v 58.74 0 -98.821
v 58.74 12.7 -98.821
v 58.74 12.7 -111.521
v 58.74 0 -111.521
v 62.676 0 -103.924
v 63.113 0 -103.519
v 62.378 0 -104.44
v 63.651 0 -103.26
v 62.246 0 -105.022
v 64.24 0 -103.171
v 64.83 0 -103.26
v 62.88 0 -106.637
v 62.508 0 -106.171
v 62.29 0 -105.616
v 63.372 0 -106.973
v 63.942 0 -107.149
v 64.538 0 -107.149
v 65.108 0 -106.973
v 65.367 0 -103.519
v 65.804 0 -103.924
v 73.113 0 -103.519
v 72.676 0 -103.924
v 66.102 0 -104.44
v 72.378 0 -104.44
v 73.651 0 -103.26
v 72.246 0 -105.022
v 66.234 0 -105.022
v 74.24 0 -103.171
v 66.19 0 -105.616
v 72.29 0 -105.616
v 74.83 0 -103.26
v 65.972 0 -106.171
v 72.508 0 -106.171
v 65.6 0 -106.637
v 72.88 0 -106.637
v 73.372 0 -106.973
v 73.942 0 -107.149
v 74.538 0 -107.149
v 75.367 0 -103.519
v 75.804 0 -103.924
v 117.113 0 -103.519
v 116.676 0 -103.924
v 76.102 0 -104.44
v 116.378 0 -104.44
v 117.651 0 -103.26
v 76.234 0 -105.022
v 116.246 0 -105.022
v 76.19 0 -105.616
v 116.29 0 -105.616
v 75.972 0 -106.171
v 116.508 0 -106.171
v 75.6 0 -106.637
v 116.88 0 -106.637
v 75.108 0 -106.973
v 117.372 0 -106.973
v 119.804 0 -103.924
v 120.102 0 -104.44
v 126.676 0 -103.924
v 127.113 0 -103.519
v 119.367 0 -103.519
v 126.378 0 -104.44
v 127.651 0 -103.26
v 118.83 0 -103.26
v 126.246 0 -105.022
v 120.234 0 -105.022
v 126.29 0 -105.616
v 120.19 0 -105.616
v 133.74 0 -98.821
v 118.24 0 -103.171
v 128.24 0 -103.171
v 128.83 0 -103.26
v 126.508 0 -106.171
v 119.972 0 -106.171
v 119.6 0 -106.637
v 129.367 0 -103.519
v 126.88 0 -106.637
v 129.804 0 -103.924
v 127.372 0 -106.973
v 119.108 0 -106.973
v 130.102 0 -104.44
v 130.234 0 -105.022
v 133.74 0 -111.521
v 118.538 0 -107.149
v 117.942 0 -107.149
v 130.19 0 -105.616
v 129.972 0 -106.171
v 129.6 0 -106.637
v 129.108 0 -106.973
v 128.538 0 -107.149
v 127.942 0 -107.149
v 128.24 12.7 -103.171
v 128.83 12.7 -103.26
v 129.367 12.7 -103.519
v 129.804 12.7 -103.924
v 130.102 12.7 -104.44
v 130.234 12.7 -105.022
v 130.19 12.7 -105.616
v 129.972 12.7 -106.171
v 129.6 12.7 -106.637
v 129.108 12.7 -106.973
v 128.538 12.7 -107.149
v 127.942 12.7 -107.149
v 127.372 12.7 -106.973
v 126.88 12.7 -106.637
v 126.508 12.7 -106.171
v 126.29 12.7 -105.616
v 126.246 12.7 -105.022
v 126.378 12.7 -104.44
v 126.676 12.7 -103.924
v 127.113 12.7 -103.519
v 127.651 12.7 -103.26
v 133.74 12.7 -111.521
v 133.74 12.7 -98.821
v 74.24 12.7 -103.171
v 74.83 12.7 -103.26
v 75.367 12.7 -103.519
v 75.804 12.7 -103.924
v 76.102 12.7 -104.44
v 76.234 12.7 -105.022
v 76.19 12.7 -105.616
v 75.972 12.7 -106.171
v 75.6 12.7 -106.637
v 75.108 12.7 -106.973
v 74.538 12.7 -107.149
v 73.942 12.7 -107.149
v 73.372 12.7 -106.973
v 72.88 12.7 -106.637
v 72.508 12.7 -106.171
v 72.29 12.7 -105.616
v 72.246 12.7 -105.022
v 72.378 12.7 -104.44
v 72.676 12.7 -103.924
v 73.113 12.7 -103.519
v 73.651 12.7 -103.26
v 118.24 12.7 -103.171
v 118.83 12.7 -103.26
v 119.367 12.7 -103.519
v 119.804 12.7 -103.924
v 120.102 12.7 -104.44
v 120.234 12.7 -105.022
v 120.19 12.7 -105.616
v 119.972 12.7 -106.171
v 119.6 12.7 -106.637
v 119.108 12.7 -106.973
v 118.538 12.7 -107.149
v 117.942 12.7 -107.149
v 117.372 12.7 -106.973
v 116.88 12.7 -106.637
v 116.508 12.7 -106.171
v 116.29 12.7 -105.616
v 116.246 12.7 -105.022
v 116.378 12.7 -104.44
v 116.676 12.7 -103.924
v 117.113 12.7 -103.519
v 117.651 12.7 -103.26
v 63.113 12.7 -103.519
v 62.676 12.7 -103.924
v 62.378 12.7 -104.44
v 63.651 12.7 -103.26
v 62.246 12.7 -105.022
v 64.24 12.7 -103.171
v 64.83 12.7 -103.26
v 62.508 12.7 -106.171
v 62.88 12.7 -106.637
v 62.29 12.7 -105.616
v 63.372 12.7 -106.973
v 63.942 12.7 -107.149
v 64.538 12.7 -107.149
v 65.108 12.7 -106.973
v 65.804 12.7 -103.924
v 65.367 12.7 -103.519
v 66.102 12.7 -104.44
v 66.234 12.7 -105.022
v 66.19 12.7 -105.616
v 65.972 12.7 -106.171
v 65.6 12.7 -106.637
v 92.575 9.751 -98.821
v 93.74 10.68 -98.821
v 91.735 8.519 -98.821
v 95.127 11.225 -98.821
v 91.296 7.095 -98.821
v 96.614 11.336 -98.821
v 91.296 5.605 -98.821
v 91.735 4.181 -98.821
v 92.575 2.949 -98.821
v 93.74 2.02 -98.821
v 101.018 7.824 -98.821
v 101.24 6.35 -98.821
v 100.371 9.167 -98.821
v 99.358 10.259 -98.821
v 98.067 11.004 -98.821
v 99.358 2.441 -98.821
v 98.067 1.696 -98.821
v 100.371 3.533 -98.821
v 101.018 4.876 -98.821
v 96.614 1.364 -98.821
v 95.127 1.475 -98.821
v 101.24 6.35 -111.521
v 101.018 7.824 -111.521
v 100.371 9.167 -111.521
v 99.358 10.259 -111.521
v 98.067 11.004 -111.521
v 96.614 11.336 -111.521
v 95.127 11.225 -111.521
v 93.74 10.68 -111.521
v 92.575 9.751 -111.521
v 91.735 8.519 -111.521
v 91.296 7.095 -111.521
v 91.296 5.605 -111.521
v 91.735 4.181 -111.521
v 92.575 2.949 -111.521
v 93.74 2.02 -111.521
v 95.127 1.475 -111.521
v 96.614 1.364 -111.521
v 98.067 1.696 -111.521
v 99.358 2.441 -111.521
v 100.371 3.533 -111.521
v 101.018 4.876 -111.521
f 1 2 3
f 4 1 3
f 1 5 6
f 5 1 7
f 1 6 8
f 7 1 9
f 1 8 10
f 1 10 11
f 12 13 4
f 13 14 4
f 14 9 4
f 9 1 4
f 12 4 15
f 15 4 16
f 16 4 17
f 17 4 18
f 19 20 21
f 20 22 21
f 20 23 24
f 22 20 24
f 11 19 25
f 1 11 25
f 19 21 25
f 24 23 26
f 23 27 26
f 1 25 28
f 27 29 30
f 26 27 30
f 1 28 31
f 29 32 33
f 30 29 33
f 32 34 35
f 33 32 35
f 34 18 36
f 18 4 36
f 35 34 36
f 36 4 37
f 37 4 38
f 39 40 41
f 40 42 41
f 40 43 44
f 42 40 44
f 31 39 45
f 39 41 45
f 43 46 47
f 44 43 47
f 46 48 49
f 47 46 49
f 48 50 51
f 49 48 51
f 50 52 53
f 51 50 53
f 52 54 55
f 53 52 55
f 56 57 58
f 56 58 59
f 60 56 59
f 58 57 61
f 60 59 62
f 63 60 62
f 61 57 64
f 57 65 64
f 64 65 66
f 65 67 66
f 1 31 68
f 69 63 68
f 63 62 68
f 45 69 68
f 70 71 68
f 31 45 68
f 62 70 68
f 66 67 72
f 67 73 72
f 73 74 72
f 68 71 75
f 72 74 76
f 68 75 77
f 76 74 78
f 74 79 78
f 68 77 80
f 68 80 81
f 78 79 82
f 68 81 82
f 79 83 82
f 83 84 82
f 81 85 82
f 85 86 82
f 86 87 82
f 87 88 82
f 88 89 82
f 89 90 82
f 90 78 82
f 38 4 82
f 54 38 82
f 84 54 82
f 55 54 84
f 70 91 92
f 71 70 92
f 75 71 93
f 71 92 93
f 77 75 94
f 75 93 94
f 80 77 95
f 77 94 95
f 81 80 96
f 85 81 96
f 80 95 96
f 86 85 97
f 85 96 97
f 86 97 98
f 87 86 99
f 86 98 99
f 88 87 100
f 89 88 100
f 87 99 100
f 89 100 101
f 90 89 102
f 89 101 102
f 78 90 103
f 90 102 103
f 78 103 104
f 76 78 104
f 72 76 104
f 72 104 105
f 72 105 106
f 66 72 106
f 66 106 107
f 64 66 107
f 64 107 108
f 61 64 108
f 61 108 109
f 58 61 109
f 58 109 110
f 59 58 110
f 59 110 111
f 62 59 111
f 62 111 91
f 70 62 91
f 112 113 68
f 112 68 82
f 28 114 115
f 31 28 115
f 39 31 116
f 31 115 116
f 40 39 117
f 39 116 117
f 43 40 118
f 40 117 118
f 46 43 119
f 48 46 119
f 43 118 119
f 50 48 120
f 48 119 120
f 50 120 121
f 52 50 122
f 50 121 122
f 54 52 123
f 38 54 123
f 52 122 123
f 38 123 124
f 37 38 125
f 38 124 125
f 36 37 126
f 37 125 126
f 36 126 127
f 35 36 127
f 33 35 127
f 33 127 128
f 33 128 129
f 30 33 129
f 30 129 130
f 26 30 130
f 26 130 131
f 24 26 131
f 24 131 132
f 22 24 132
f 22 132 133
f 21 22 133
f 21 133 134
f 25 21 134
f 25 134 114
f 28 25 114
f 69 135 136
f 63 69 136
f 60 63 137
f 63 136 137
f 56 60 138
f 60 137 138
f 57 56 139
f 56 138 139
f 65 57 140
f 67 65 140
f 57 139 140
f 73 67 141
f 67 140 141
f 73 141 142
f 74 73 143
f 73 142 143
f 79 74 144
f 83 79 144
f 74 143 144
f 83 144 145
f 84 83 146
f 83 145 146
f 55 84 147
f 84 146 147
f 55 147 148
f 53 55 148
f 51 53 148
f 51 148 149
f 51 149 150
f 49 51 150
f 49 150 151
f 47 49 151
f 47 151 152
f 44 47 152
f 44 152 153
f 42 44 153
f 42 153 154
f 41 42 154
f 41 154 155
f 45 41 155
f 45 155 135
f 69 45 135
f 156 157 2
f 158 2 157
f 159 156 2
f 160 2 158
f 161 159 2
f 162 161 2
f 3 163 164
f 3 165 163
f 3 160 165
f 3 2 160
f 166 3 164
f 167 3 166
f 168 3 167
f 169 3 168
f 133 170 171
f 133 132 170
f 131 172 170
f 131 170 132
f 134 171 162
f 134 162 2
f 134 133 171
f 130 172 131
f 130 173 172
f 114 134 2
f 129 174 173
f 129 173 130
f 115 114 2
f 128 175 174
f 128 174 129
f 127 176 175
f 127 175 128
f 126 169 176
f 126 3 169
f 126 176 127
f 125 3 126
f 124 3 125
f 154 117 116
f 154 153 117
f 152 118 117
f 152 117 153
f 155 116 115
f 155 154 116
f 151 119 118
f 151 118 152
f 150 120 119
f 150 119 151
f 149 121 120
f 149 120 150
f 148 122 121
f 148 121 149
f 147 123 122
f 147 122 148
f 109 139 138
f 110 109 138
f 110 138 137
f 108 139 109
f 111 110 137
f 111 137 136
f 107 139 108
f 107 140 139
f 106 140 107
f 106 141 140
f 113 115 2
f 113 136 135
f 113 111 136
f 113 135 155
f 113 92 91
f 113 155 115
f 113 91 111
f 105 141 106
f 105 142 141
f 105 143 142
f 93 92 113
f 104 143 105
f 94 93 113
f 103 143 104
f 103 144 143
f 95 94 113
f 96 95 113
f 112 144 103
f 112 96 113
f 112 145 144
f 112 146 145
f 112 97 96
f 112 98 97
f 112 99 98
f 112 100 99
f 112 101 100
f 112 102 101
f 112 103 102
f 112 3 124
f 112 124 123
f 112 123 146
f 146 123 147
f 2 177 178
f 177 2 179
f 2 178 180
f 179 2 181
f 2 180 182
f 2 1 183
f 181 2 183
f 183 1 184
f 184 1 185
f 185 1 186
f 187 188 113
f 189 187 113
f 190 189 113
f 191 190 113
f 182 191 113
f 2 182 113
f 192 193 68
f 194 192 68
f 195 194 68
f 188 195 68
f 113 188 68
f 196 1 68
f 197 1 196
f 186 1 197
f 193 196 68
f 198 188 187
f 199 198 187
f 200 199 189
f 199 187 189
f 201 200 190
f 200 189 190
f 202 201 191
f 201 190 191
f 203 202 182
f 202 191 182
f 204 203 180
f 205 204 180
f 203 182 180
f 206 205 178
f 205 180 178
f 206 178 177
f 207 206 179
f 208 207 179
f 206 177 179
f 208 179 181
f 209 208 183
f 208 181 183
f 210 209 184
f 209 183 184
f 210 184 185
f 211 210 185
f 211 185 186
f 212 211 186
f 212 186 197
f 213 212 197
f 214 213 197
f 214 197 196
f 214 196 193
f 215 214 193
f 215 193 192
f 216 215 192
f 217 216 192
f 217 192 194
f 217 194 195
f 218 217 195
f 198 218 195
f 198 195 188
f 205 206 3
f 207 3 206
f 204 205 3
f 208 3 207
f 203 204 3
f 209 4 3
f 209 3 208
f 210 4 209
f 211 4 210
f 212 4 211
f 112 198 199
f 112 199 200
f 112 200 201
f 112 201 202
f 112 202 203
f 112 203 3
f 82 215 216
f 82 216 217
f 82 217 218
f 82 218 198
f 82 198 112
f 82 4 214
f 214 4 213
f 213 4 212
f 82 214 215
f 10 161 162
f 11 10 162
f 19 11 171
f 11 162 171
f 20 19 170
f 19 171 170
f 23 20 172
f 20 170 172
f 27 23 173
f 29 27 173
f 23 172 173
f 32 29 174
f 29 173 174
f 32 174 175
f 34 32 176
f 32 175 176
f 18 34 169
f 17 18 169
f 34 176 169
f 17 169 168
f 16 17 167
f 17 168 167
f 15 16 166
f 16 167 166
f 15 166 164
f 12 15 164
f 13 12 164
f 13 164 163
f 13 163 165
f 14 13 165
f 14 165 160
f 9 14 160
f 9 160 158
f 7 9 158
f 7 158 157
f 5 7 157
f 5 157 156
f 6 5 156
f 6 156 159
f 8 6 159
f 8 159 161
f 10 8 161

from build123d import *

# Parameters (mm, degrees)
SKETCH1_W           = 75
SKETCH1_H           = 12.7
BOSS_EXTRUDE2_DEPTH = 12.7
SKETCH2_R           = 2
CUT_EXTRUDE1_DEPTH  = 175.598479387
SKETCH3_R           = 5
CUT_EXTRUDE2_DEPTH  = 135.940675175


with BuildPart() as part:
    # Sketch1 → Boss-Extrude2 (new body)
    with BuildSketch(Plane(origin=(0, 0, 0), x_dir=(1, 0, 0), z_dir=(0, 1, 0))):
        with Locations((96.240068104, 105.170998865)):
            Rectangle(SKETCH1_W, SKETCH1_H)
    extrude(amount=BOSS_EXTRUDE2_DEPTH)

    # Sketch2 → Cut-Extrude1 (cut, through all)
    with BuildSketch(Plane(origin=(0, 12.7, 0), x_dir=(1, 0, 0), z_dir=(0, 1, 0))):
        with Locations(Location((74.240068104, 105.170998865, 0), (0, 0, 270))):
            Circle(SKETCH2_R)
        with Locations(Location((64.240068104, 105.170998865, 0), (0, 0, 270))):
            Circle(SKETCH2_R)
        with Locations(Location((118.240068104, 105.170998865, 0), (0, 0, 270))):
            Circle(SKETCH2_R)
        with Locations(Location((128.240068104, 105.170998865, 0), (0, 0, 270))):
            Circle(SKETCH2_R)
    extrude(amount=-CUT_EXTRUDE1_DEPTH, mode=Mode.SUBTRACT)

    # Sketch3 → Cut-Extrude2 (cut, through all)
    with BuildSketch(Plane.XY.offset(-98.820998865)):
        with Locations((96.240068104, 6.35)):
            Circle(SKETCH3_R)
    extrude(amount=-CUT_EXTRUDE2_DEPTH, mode=Mode.SUBTRACT)


solid = part.part
